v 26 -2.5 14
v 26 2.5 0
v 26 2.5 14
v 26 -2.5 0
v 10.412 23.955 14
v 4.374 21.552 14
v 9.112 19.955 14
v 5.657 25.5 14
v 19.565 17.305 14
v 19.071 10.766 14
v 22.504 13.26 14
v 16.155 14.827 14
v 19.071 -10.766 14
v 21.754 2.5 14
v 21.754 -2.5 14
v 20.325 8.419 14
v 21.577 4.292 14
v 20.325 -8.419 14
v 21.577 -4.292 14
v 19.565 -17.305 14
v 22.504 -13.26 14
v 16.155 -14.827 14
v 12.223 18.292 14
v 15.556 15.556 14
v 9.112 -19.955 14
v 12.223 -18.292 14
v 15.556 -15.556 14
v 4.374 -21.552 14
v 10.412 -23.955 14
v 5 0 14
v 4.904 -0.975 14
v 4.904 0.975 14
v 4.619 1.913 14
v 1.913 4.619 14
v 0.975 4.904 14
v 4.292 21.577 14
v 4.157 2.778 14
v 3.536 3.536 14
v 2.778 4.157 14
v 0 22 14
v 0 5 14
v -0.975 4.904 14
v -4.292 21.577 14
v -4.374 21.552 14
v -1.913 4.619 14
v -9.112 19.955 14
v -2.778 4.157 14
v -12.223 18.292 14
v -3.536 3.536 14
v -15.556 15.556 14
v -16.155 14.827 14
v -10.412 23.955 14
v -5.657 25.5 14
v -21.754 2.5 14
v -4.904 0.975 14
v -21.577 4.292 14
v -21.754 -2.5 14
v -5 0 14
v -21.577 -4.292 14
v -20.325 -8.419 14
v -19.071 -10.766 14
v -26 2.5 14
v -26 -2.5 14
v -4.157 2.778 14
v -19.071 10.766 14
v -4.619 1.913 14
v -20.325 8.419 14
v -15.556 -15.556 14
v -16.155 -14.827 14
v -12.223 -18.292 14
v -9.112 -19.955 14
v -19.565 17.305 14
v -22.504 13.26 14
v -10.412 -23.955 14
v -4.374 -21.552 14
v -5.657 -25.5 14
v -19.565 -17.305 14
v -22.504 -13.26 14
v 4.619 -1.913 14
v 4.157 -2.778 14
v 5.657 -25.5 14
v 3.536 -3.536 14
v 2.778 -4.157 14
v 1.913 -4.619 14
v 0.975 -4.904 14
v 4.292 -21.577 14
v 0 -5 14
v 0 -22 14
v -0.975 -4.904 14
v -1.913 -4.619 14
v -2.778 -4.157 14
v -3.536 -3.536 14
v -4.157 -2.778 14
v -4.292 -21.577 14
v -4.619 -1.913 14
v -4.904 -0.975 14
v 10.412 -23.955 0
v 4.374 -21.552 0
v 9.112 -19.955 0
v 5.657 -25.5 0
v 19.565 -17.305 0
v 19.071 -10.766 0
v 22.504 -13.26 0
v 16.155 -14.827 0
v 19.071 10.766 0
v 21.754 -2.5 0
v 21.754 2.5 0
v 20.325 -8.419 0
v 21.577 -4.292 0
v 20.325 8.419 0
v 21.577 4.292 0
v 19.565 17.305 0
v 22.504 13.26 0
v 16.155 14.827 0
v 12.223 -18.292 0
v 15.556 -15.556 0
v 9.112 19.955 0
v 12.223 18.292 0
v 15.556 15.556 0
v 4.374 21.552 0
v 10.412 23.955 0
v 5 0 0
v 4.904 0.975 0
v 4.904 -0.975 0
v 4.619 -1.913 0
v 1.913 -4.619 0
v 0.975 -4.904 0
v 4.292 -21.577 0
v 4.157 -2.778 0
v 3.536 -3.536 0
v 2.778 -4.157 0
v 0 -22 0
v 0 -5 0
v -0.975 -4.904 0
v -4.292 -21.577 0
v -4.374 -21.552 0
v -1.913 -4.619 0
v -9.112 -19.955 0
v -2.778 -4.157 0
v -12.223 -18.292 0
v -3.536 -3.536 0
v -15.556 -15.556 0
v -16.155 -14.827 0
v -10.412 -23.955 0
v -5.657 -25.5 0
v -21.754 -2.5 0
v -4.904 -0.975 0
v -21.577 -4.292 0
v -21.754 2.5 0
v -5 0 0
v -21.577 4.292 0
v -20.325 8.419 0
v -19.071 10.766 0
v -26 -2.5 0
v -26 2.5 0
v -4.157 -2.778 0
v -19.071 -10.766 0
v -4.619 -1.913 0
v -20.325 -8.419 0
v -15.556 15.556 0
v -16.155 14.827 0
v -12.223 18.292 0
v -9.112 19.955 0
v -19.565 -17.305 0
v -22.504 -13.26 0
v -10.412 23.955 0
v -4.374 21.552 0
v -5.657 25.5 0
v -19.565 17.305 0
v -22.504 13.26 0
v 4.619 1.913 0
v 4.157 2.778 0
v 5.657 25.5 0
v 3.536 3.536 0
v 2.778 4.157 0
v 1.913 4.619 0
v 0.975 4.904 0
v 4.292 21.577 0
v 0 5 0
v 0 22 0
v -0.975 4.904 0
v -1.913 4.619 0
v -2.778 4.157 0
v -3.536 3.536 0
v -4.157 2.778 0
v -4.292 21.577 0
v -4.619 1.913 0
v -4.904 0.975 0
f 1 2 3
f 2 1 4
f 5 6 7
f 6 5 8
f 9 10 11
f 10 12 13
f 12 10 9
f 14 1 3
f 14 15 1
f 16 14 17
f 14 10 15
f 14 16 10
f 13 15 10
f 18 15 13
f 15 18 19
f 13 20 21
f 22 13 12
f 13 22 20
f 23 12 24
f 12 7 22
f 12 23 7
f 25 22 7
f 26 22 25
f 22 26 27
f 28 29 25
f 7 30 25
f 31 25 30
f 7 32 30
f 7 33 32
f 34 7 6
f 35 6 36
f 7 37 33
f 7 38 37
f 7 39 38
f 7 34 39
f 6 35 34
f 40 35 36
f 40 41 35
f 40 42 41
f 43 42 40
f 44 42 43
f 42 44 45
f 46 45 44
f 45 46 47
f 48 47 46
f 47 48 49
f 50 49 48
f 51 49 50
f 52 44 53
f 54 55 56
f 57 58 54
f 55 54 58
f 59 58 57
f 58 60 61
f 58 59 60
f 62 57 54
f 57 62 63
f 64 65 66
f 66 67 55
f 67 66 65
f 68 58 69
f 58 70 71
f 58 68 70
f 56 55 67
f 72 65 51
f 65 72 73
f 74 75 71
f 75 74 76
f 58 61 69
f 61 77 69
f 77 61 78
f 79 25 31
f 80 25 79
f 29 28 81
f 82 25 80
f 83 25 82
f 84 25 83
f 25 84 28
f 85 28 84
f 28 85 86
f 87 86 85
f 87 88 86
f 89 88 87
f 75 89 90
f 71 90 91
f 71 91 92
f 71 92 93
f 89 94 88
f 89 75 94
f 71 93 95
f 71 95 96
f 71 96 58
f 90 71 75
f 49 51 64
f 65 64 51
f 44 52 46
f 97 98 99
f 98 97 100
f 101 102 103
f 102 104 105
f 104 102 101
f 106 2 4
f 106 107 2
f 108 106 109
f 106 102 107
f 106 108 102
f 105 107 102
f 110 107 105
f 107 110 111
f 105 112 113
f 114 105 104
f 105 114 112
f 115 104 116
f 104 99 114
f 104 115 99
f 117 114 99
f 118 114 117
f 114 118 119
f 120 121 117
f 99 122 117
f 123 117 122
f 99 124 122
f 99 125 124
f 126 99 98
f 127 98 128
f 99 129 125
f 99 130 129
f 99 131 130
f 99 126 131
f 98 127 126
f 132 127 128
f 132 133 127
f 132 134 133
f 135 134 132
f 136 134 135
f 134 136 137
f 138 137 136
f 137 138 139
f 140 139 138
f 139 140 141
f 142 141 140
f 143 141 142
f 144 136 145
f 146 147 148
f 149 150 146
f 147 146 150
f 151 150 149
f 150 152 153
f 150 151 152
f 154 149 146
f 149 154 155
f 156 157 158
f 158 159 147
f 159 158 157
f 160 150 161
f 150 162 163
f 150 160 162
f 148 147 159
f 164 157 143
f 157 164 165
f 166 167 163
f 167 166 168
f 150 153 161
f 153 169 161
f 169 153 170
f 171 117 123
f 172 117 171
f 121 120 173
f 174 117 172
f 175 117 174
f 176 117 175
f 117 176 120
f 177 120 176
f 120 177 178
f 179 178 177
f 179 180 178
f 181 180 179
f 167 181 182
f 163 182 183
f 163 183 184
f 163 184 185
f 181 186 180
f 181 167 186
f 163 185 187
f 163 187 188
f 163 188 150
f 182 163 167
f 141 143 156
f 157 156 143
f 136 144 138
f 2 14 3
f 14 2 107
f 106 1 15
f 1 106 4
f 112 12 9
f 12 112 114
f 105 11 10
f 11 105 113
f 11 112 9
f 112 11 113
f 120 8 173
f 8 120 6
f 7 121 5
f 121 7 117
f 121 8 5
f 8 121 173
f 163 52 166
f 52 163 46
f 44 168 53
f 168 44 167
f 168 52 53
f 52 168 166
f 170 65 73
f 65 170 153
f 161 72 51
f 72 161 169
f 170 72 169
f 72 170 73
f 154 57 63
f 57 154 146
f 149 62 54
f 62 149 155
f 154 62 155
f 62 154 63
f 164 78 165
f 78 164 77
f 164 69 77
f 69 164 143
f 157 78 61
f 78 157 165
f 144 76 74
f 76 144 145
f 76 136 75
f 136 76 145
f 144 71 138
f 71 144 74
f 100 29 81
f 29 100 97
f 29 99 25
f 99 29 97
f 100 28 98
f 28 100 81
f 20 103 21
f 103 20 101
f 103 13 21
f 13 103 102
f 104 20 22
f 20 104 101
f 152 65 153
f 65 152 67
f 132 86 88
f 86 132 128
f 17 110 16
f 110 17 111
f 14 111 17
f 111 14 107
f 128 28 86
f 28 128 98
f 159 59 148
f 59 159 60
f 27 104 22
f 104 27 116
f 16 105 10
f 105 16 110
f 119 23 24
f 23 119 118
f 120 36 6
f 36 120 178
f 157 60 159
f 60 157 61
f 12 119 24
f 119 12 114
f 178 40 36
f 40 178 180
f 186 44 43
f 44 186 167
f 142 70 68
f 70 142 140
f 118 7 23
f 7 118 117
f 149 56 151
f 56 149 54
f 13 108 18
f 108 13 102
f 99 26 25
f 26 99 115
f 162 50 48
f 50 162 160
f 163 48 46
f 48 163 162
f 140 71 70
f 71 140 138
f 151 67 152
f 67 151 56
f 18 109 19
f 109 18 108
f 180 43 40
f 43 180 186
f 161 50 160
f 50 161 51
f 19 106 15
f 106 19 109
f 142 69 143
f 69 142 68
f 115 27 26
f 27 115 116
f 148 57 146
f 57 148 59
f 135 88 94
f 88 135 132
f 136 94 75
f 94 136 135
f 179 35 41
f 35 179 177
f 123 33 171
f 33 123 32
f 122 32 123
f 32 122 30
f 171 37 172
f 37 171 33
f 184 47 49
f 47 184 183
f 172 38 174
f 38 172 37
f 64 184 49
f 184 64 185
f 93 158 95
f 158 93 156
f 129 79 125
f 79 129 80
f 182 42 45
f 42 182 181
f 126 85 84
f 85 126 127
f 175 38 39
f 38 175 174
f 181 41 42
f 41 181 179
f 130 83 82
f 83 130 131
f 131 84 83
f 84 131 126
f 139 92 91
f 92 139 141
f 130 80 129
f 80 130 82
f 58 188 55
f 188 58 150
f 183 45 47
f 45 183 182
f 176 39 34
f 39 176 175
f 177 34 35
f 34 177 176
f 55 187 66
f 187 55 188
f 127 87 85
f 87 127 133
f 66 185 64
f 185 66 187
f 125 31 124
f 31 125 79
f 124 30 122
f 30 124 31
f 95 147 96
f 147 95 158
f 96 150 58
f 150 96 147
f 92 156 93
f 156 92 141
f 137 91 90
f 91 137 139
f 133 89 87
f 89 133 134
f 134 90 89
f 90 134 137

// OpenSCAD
$fn = 32;

// ----------------------------------------------------------------------
// Spur blank: bored gear blank
// ----------------------------------------------------------------------

// --- parameters (mm) ---
disc_r = 22;              // blank root radius
disc_t = 14;              // blank thickness
n_teeth = 10;             // stub tooth count
tooth_w = 5;              // tooth width at the root
tooth_h = 4;              // tooth height above the root
bore_r = 5;               // central bore radius

out_r = disc_r + tooth_h;  // tip radius
bbox_x = 52.0;  // measured width over the teeth
bbox_y = 51.0;  // measured depth over the teeth

difference() {
union() {
  cylinder(r = disc_r, h = disc_t);
  for (i = [0 : n_teeth - 1])
    rotate([0, 0, i * 360 / n_teeth])
      translate([disc_r - 1, -tooth_w / 2, 0])
        cube([tooth_h + 1, tooth_w, disc_t]);
}
  translate([0, 0, -1]) cylinder(r = bore_r, h = disc_t + 2);
}
